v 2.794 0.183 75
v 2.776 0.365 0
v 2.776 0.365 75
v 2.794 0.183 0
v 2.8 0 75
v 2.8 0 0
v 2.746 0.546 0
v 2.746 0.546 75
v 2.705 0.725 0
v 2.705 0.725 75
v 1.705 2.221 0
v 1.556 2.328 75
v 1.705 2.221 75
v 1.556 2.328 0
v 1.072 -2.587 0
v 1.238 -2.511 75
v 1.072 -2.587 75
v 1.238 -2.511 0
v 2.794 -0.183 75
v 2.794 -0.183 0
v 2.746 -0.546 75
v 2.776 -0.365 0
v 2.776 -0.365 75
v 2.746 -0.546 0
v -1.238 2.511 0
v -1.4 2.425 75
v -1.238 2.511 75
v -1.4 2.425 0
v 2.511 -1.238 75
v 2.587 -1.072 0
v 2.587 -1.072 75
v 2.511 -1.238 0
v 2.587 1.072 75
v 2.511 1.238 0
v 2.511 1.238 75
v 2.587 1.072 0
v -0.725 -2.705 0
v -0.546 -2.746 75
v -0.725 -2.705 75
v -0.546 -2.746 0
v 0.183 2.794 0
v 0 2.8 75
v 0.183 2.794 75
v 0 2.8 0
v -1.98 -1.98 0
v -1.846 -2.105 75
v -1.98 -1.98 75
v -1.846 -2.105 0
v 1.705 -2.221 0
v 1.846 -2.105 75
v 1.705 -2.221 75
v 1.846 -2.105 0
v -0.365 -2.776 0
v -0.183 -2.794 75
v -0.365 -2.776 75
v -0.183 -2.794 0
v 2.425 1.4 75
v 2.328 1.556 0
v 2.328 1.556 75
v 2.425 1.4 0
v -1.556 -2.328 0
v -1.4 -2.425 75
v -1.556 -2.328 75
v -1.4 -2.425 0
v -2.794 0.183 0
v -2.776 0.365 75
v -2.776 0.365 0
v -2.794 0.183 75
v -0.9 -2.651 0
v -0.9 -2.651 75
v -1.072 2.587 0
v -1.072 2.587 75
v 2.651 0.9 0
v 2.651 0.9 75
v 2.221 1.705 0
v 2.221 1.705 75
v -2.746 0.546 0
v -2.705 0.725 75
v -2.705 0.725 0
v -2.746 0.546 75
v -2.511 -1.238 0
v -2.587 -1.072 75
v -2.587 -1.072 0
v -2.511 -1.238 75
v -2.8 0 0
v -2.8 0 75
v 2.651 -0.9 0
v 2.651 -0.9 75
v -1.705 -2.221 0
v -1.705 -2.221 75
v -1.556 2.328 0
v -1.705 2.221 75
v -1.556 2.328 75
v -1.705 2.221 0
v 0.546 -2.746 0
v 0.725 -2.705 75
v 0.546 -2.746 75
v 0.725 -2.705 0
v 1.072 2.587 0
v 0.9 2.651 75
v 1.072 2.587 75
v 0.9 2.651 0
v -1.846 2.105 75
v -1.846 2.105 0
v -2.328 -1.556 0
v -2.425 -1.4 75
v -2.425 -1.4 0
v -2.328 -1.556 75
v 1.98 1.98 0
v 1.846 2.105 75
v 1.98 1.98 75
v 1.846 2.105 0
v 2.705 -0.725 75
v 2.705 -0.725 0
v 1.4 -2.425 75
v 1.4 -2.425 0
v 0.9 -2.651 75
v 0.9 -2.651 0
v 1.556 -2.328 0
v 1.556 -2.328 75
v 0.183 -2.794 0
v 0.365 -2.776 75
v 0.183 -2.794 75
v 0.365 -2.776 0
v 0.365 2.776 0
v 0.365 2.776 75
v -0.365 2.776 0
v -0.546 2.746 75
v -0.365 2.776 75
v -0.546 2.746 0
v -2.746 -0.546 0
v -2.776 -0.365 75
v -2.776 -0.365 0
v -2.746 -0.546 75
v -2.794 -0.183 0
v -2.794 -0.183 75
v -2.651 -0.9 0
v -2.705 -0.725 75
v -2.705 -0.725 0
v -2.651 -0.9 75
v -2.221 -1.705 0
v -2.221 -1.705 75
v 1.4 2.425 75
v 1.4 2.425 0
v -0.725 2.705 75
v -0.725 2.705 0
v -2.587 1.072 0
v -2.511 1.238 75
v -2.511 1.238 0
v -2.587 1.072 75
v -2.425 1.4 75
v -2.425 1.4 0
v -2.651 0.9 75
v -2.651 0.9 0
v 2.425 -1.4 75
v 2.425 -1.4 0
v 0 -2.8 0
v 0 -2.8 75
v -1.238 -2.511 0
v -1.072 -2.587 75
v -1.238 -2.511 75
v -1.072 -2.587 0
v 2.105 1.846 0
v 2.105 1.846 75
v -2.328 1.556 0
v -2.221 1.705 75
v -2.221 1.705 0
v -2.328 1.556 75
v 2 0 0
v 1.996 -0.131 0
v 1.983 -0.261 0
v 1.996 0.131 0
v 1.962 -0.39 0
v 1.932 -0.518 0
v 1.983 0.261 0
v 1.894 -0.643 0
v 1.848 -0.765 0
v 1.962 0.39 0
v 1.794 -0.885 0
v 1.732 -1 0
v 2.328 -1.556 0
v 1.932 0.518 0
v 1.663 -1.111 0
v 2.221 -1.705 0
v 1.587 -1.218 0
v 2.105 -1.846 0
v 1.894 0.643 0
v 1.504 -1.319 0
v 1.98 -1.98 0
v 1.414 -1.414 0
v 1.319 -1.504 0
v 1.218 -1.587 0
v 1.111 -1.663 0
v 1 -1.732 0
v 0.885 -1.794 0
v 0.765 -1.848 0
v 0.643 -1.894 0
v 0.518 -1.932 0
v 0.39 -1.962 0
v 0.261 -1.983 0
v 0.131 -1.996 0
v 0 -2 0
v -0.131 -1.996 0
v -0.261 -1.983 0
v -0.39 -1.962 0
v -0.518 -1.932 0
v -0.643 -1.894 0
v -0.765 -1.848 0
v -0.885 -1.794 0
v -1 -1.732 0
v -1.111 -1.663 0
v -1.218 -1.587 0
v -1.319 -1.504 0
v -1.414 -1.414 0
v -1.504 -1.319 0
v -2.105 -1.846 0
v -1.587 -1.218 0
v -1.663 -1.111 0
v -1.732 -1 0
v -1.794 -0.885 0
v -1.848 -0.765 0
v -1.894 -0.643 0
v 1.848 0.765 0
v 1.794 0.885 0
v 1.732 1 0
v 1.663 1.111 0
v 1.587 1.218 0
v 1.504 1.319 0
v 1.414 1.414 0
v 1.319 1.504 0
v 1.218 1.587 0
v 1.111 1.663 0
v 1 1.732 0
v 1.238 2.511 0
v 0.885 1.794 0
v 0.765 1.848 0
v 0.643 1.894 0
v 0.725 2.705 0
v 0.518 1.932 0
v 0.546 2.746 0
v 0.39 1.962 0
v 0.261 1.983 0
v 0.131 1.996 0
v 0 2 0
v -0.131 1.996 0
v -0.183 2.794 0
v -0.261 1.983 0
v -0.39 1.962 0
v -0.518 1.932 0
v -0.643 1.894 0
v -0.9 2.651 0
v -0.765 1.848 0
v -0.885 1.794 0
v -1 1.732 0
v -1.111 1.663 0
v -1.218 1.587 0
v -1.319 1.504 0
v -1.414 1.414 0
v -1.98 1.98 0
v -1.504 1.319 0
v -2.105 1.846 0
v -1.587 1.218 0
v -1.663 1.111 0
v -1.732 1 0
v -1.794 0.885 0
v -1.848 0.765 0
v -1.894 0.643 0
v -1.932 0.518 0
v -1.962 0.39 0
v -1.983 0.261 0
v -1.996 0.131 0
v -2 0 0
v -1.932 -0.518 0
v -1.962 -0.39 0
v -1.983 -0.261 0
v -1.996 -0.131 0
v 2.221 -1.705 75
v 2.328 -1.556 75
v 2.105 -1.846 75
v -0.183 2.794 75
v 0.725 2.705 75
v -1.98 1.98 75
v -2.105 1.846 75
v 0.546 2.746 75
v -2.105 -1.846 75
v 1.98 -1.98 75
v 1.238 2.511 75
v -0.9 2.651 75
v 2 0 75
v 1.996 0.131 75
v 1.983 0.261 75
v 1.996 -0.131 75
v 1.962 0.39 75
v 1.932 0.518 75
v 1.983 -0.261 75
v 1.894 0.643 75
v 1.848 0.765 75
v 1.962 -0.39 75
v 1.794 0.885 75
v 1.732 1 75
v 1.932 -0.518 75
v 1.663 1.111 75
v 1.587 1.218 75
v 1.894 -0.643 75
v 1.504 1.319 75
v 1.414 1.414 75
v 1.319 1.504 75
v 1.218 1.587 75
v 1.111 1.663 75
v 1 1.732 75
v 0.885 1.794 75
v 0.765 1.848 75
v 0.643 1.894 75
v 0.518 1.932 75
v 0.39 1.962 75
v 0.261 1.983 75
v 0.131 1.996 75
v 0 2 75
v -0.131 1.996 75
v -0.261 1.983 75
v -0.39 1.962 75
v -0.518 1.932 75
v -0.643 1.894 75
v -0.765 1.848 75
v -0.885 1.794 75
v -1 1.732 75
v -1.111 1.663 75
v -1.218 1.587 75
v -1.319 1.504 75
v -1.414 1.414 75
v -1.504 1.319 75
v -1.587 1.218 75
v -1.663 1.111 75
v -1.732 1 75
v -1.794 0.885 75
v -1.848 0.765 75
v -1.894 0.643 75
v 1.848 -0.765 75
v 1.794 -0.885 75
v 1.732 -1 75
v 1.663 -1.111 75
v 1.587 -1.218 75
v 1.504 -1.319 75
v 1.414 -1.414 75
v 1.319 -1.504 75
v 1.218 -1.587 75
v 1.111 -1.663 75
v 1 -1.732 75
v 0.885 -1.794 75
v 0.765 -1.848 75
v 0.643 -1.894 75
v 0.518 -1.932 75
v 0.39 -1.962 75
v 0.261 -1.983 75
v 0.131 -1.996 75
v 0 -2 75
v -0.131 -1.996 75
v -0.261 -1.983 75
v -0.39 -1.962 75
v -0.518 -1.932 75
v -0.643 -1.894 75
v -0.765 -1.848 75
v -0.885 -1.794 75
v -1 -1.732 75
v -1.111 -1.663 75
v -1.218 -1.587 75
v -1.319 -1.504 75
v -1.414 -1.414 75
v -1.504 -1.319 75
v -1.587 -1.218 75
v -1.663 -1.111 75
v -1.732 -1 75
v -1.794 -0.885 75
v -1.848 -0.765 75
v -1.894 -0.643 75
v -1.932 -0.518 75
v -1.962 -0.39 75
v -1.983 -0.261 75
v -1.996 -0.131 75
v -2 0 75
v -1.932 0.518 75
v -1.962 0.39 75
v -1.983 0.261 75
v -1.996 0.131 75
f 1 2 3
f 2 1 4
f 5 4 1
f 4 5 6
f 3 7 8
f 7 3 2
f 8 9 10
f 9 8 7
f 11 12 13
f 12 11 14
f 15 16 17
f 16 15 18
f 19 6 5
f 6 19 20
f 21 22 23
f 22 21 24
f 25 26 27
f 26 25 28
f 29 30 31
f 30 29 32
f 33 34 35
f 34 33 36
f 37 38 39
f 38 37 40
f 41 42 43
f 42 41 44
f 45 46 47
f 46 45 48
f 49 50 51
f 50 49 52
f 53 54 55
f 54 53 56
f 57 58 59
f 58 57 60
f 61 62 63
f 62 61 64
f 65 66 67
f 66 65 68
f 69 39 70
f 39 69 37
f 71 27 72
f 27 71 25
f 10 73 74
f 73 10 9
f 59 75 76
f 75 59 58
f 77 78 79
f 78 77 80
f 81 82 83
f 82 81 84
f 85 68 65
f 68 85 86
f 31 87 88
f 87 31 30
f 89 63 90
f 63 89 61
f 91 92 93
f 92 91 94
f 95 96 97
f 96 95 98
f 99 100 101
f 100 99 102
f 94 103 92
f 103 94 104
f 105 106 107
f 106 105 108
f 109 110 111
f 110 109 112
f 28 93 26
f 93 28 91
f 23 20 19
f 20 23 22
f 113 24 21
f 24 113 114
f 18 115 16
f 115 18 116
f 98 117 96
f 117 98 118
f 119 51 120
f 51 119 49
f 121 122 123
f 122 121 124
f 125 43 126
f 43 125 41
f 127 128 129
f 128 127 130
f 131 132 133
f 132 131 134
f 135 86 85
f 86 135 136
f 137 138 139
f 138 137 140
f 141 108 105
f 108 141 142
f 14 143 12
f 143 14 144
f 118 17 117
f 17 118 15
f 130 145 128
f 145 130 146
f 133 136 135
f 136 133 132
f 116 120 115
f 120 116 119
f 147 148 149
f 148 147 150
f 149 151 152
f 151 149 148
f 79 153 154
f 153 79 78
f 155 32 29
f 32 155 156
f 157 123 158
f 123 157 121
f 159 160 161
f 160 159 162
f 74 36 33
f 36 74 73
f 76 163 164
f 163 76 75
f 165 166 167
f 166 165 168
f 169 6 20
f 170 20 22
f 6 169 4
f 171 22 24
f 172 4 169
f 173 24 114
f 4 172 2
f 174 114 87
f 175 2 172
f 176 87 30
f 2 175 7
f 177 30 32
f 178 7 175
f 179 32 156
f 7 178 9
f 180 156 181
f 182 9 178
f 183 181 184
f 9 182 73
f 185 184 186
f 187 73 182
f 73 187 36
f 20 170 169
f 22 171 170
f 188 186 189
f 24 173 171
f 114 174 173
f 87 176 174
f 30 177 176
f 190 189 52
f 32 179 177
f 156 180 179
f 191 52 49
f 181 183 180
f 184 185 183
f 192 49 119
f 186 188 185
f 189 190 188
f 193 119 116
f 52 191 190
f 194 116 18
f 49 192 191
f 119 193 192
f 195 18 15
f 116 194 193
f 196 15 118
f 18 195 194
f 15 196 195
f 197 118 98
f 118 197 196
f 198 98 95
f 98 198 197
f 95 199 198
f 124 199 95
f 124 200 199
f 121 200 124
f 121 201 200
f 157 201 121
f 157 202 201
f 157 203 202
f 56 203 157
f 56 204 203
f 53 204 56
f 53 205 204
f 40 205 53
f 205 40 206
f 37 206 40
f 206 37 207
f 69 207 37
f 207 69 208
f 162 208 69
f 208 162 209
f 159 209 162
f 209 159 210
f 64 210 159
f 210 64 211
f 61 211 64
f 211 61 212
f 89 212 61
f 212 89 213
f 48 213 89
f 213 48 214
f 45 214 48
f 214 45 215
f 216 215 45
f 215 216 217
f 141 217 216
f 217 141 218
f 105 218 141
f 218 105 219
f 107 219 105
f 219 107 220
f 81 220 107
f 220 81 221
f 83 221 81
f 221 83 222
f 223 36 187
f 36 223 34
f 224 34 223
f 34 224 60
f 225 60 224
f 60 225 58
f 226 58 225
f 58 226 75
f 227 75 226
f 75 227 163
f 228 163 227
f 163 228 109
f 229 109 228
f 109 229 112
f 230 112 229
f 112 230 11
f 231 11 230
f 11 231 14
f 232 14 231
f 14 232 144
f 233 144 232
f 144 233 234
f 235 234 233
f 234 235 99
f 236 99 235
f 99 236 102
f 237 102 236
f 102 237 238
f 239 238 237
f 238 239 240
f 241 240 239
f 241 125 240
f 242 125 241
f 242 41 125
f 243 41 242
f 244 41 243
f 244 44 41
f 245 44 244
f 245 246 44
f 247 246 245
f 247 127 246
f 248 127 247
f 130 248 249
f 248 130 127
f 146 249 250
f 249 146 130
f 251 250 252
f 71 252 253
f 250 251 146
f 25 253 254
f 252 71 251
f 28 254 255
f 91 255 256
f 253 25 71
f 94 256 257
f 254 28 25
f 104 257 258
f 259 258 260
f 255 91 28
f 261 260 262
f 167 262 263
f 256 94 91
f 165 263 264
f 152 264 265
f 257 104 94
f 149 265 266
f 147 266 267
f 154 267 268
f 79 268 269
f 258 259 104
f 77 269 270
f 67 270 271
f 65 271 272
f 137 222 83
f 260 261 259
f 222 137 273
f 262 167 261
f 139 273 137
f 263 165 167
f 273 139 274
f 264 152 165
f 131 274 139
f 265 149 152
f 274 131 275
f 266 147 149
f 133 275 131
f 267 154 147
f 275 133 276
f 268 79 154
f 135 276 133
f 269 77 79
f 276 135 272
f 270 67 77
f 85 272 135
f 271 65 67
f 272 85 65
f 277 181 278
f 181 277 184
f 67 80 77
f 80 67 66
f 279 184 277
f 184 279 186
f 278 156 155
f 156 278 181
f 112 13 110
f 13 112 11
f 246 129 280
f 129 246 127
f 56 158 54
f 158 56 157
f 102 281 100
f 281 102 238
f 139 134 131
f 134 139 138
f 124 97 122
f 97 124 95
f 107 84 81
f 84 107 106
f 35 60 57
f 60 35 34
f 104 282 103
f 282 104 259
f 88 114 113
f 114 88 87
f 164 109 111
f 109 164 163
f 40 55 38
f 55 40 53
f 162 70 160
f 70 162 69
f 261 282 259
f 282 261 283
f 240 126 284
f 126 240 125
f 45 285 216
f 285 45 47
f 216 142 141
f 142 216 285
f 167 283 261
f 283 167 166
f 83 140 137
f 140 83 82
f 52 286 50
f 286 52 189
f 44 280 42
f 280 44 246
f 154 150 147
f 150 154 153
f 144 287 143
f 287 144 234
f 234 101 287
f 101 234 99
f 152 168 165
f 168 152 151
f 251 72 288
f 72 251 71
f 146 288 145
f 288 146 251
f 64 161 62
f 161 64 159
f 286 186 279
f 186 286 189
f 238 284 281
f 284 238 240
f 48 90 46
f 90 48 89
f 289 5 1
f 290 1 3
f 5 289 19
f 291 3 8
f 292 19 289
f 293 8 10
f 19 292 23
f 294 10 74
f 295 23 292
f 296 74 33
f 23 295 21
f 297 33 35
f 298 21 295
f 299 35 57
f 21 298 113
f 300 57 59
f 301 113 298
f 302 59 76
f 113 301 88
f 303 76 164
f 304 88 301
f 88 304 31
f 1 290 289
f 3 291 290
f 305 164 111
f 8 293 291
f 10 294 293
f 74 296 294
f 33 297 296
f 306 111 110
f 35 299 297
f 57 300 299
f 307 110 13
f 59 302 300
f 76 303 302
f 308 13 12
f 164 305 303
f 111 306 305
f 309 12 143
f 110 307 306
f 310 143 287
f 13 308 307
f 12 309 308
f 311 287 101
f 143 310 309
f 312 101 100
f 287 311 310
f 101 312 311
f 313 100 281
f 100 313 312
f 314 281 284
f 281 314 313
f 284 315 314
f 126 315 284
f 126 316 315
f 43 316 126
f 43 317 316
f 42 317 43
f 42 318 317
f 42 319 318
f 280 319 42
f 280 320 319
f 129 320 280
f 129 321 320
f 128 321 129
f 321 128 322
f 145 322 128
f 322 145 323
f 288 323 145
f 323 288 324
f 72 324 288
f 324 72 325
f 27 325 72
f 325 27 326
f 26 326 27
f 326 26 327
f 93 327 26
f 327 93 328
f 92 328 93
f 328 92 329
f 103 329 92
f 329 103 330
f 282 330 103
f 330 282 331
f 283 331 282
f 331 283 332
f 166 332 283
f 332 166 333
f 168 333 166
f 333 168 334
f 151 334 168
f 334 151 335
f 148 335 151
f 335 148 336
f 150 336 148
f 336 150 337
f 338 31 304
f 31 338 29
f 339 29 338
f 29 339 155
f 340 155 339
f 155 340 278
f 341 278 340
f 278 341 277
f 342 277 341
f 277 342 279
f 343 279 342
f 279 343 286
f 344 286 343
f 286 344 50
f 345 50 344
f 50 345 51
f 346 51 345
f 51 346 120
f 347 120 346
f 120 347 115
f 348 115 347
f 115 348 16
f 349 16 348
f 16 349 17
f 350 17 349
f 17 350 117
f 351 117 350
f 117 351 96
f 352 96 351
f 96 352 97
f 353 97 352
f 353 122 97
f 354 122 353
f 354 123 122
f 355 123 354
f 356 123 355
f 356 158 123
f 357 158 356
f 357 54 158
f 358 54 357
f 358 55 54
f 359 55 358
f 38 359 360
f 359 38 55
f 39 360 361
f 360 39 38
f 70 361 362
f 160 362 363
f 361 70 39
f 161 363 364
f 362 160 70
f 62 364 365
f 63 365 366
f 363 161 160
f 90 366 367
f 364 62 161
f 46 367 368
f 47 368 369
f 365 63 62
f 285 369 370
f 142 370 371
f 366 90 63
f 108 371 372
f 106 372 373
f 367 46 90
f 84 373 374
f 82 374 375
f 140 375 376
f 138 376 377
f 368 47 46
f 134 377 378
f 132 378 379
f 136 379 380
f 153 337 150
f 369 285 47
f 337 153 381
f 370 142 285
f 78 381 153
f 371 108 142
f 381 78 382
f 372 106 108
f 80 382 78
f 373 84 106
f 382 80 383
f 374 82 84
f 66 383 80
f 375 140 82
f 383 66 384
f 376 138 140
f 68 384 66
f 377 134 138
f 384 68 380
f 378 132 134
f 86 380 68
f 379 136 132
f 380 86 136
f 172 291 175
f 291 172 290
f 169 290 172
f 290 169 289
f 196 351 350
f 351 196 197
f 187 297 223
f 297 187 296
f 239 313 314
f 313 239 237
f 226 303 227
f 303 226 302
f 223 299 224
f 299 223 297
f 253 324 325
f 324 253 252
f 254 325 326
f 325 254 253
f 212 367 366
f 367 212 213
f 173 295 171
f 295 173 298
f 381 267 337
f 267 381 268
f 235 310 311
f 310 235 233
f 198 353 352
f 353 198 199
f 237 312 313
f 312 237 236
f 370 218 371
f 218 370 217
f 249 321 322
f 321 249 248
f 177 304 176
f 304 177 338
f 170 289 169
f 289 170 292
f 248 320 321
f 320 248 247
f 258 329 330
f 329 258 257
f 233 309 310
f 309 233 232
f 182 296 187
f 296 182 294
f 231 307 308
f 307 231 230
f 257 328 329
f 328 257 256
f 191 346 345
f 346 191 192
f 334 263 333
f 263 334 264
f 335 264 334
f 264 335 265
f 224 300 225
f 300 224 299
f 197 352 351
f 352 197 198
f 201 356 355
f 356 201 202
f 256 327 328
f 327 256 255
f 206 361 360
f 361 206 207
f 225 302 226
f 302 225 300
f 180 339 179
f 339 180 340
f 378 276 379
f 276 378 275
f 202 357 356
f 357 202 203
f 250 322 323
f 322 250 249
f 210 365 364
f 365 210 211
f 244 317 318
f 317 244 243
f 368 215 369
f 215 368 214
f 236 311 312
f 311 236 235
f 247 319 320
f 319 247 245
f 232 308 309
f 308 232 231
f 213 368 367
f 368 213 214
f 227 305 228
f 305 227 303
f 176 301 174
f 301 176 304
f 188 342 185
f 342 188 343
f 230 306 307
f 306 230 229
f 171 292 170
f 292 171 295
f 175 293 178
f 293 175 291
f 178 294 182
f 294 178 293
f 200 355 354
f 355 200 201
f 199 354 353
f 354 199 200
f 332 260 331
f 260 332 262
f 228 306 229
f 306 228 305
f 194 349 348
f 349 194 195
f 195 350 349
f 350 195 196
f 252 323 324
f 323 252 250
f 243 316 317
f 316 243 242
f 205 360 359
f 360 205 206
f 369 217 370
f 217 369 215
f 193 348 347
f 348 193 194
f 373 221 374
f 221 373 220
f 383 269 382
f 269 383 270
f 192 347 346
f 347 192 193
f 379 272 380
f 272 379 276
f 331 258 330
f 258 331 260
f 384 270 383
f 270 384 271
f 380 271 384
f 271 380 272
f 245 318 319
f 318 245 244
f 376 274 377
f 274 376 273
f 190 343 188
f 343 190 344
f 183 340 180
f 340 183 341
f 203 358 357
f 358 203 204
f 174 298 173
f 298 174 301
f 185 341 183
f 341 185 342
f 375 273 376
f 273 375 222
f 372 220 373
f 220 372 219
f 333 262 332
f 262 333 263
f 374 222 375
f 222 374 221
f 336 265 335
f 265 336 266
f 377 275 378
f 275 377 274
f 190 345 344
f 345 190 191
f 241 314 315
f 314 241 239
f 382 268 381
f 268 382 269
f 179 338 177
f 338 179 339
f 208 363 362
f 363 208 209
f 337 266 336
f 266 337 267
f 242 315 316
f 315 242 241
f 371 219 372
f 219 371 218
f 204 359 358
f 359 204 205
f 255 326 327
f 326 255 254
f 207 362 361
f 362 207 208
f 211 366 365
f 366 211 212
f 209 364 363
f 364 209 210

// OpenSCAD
// file: params.scad
// Shared parameters for the DMX truss controller housing.
// All sizes in mm. "VERIFIED" = read from a datasheet/drawing, "PROPOSAL" = my design choice.
// Coordinates: z is the axis through the middle of the ring, +z towards the viewer.
// z = 0 is the wall side (back of the base).

$fn = 96;

// ---------- base (octagon) ----------
base_flat      = 90;     // across flats                                   PROPOSAL
base_depth     = 22;     // z height of the base for the FIRST TEST         PROPOSAL
base_wall      = 2.5;    // wall thickness                                 PROPOSAL
back_plate     = 2.5;    // back plate thickness                           PROPOSAL
base_r_corner  = base_flat / 2 / cos(22.5);   // circumradius of the octagon

// ---------- pedestal and ring ----------
pedestal_od    = 58;     // PROPOSAL
pedestal_h     = 18;     // PROPOSAL
ring_od        = 58;     // PROPOSAL
ring_id        = 43.0;   // PROPOSAL: carrier radius 20.65 + 0.85 mm running gap (was 41.6 = only 0.15 mm)
ring_h         = 13.2;   // PROPOSAL
ring_gap       = 0.8;    // gap between pedestal top and ring                 PROPOSAL

// ---------- motor: SparkFun ROB-20441 = OT-EM3215D2450Y1R-BEZE (datasheet p8) ----------
// Sizes below are read from the drawing. UNVERIFIED (not stated on the drawing): which face is the stator
// mounting face, which part turns (rotor cup vs hollow shaft), and the gap between rotor and stator base.
// The drawing also shows 2 x dia 2.0 holes on a dia 21.0 circle (not used here). Check on the real motor first.
motor_od       = 32.0;   // VERIFIED rotor/body diameter (32.0 +0.025)
motor_h        = 15.0;   // VERIFIED overall height (15.0 +-0.2)
motor_body_h   = 12.8;   // VERIFIED height of the rotor body without the boss
motor_boss_d   = 11.5;   // VERIFIED raised boss on top of the rotor (11.5 +-0.1)
motor_boss_h   = 2.2;    // VERIFIED (15.0 - 12.8)
motor_bore     = 5.9;    // VERIFIED hollow shaft (5.9 +0.1)
motor_hole_n   = 3;      // read from drawing: three M1.6 holes (face unverified)
motor_hole_pcd = 20.5;   // VERIFIED pitch circle (20.5 +0.1)
motor_hole_thr = 1.6;    // VERIFIED thread M1.6 x 0.35, depth 6.0
motor_poles    = 8;      // VERIFIED datasheet: 8 magnetic poles (SmartKnob firmware assumed 14)

// ---------- display: Waveshare 1.28in Touch LCD ----------
disp_od        = 38.5;   // VERIFIED (Waveshare), round PCB diameter
disp_glass     = 32.4;   // VERIFIED
disp_len       = 39.89;  // VERIFIED, module length including the connector tab

// ---------- Arduino Nano ESP32 ----------
nano_l         = 43.18;  // VERIFIED (Arduino datasheet, mechanical page)
nano_w         = 17.78;  // VERIFIED
nano_hole_dx   = 40.64;  // VERIFIED
nano_hole_dy   = 15.24;  // VERIFIED
nano_hole_d    = 1.66;   // VERIFIED (take M1.6 screws)

// ---------- perfboard ----------
board_x        = 70;     // user owns a 5 x 7 cm perfboard
board_y        = 50;
board_corner   = 4;      // corner cut so it fits the octagon                PROPOSAL

// ---------- USB-C plug (first test: supply plugs straight into the Nano) ----------
usbc_slot_w    = 16;     // PROPOSAL: spec max overmold 12.35 x 6.5, real cables up to 13.0 x 7.4
usbc_slot_h    = 10;     // PROPOSAL

// ---------- Neutrik D-size panel cut-out (XLR NC3FD-LX and USB-C NAUSBC-5G-FL alike) ----------
d_hole         = 24;     // VERIFIED (Neutrik drawing)
d_screw_dx     = 19;     // VERIFIED
d_screw_dy     = 24;     // VERIFIED
d_screw_d      = 3.2;    // VERIFIED
d_flange_w     = 26;     // VERIFIED
d_flange_h     = 31;     // VERIFIED

// ---------- wall mount ----------
key_dx         = 70;     // distance between the two keyholes                PROPOSAL
key_head       = 7;      // head hole diameter                               PROPOSAL
key_slot       = 3.5;    // slot width                                       PROPOSAL
key_slot_len   = 7;      // PROPOSAL

// ---------- fits ----------
fit            = 0.2;    // printer clearance for sliding/clamped fits (PETG, 0.4 mm nozzle)

echo(str("octagon circumradius = ", base_r_corner));

// ---------- z stack of the turning side, derived once and used by every part ----------
// z = 0 is the back of the base. Base is base_depth tall; the front plate closes it at the top.
plate_t        = 2.5;                              // front plate thickness
z_plate_top    = base_depth;                       // 22
z_motor_bot    = z_plate_top;                      // the stator sits ON the plate
z_rotor_top    = z_motor_bot + motor_body_h;       // 34.8
z_boss_top     = z_motor_bot + motor_h;            // 37.0
z_ped_bot      = z_plate_top;
z_ped_top      = z_ped_bot + pedestal_h;           // 40
z_ring_bot     = z_ped_top + ring_gap;             // 40.8
z_ring_top     = z_ring_bot + ring_h;              // 54.0
// display: glass about 1.5 mm below the ring top
glass_recess   = 1.5;                              // PROPOSAL
module_t       = 3.575;                            // VERIFIED: Waveshare 1.28in 2D drawing, total thickness 3.575 (+-0.15). TP 1.85 + LCM 1.55 + PCB 1.0 are the parts of that stack
z_module_top   = z_ring_top - glass_recess;
z_module_bot   = z_module_top - module_t;
carrier_t      = 4;                                // carrier plate thickness
pocket_h       = 2.2;                              // pocket depth for the module pcb
z_carrier_bot  = z_module_bot + pocket_h - carrier_t;   // carrier underside
z_hub_bot      = z_boss_top - motor_boss_h;        // hub rests on the rotor top face (34.8)
hub_t          = 2.4;
z_hub_top      = z_hub_bot + hub_t;
// the column must reach from its foot to the carrier underside
col_foot_z     = z_plate_top - plate_t - 3;        // foot sits under the front plate, 3 mm foot
col_top_z      = z_carrier_bot + (carrier_t - pocket_h) - 0.2;   // 0.2 mm below the pocket floor
// main file
// TEST PRINTS (not final parts). Fast PETG prints to check fits on the real printer, before the full parts.
// Print these three files. Each is small and quick. (The clearance ring was dropped: test against the real motor instead.)
include <params.scad>

// column.scad defines these; repeated here so this file stands alone
col_od = motor_bore + 0.1 - 0.4;   // 5.6
col_id = col_od - 2 * 0.8;          // 4.0

// -------- 1. Guide tube test: fits the 5.9 mm motor bore, carries display wires --------
// Outer 5.6 (bore 5.9 +0.1 minus 0.4 clearance), inner 4.0 for ~10 thin wires. 75 mm long.
module guide_tube() {
    difference() {
        cylinder(d = col_od, h = 75);
        translate([0, 0, -1]) cylinder(d = col_id, h = 77);
    }
}

// -------- 2. Short shafts: five loose tubes, push each into the REAL motor bore and spin the motor by hand --------
// OD 5.3 / 5.4 / 5.5 / 5.6 / 5.7, ID 4.0, so the same print also checks the wire space.
// The height tells them apart: 10 mm = OD 5.3, 11 mm = 5.4, 12 mm = 5.5, 13 mm = 5.6, 14 mm = 5.7. Print standing up, nothing joins them.
module shafts() {
    for (i = [0 : 4])
        translate([i * 9, 0, 0]) difference() {
            cylinder(d = 5.3 + i * 0.1, h = 10 + i, $fn = 64);
            translate([0, 0, -1]) cylinder(d = 4.0, h = 20, $fn = 64);
        }
}

// -------- 3. Brace test: MT6701 board mounting, 28 x 28 plate with the four M2 holes at 16.5 mm --------
module brace_test() {
    difference() {
        translate([-14, -14, 0]) cube([28, 28, 3]);
        translate([0, 0, -1]) cylinder(d = 8, h = 5, $fn = 40);            // centre opening for the wires
        for (sx = [-1, 1], sy = [-1, 1])
            translate([sx * mt_hole_pitch / 2, sy * mt_hole_pitch / 2, -1]) cylinder(d = 2.2, h = 5, $fn = 32);
        translate([-mt_board / 2, -mt_board / 2, 3 - 1.6]) cube([mt_board, mt_board, 2]);   // board pocket (1.6 mm pcb)
    }
}

// choose which one to export: -D part="guide"|"shafts"|"brace"
part = "guide";
if (part == "guide") guide_tube();
if (part == "shafts") shafts();
if (part == "brace") brace_test();
